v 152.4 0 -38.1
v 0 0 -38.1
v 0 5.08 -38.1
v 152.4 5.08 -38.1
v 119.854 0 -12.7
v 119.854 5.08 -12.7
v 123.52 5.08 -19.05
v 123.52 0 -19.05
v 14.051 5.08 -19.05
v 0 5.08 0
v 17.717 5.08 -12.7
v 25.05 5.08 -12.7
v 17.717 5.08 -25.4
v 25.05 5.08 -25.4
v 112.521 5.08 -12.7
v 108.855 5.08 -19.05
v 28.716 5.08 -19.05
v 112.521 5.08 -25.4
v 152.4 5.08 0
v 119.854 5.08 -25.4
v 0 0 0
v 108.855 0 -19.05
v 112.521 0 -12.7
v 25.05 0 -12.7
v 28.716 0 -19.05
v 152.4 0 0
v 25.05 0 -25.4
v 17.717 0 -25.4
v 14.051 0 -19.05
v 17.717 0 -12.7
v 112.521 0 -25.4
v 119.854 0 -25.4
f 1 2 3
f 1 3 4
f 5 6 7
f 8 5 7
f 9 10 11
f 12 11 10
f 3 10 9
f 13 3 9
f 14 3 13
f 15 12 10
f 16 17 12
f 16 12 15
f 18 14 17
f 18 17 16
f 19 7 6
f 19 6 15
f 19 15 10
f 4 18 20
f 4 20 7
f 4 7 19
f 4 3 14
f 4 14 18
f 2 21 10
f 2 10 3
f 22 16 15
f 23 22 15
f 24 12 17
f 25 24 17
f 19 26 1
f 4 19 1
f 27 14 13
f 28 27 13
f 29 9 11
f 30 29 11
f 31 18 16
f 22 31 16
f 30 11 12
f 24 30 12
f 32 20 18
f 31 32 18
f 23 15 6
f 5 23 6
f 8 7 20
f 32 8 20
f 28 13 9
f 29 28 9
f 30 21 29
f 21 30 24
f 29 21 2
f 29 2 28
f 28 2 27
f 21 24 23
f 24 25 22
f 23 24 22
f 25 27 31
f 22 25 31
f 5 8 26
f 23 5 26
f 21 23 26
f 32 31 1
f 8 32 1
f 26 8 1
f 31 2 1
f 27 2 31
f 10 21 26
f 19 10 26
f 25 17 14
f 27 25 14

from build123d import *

# Parameters (mm, degrees)
SKETCH1_W           = 152.4
SKETCH1_H           = 38.1
BOSS_EXTRUDE1_DEPTH = 5.08
CUT_EXTRUDE1_DEPTH  = 158.172441605
CUT_EXTRUDE3_DEPTH  = 158.172441605


with BuildPart() as part:
    # Sketch1 → Boss-Extrude1 (new body)
    with BuildSketch(Plane(origin=(0, 0, 0), x_dir=(1, 0, 0), z_dir=(0, 1, 0))):
        with Locations((76.2, 19.05)):
            Rectangle(SKETCH1_W, SKETCH1_H)
    extrude(amount=BOSS_EXTRUDE1_DEPTH)

    # Sketch2 → Cut-Extrude1 (cut, through all)
    with BuildSketch(Plane(origin=(0, 5.08, 0), x_dir=(1, 0, 0), z_dir=(0, 1, 0))):
        Polygon((25.049816881, 12.7), (28.71599109, 19.05), (25.049816881, 25.4), (17.717468462, 25.4), (14.051294253, 19.05), (17.717468462, 12.7), align=None)
    extrude(amount=-CUT_EXTRUDE1_DEPTH, mode=Mode.SUBTRACT)

    # Sketch5 → Cut-Extrude3 (cut, through all)
    with BuildSketch(Plane(origin=(0, 5.08, 0), x_dir=(1, 0, 0), z_dir=(0, 1, 0))):
        Polygon((119.853560994, 25.4), (112.521212575, 25.4), (108.855038366, 19.05), (112.521212575, 12.7), (119.853560994, 12.7), (123.519735203, 19.05), align=None)
    extrude(amount=-CUT_EXTRUDE3_DEPTH, mode=Mode.SUBTRACT)


solid = part.part
